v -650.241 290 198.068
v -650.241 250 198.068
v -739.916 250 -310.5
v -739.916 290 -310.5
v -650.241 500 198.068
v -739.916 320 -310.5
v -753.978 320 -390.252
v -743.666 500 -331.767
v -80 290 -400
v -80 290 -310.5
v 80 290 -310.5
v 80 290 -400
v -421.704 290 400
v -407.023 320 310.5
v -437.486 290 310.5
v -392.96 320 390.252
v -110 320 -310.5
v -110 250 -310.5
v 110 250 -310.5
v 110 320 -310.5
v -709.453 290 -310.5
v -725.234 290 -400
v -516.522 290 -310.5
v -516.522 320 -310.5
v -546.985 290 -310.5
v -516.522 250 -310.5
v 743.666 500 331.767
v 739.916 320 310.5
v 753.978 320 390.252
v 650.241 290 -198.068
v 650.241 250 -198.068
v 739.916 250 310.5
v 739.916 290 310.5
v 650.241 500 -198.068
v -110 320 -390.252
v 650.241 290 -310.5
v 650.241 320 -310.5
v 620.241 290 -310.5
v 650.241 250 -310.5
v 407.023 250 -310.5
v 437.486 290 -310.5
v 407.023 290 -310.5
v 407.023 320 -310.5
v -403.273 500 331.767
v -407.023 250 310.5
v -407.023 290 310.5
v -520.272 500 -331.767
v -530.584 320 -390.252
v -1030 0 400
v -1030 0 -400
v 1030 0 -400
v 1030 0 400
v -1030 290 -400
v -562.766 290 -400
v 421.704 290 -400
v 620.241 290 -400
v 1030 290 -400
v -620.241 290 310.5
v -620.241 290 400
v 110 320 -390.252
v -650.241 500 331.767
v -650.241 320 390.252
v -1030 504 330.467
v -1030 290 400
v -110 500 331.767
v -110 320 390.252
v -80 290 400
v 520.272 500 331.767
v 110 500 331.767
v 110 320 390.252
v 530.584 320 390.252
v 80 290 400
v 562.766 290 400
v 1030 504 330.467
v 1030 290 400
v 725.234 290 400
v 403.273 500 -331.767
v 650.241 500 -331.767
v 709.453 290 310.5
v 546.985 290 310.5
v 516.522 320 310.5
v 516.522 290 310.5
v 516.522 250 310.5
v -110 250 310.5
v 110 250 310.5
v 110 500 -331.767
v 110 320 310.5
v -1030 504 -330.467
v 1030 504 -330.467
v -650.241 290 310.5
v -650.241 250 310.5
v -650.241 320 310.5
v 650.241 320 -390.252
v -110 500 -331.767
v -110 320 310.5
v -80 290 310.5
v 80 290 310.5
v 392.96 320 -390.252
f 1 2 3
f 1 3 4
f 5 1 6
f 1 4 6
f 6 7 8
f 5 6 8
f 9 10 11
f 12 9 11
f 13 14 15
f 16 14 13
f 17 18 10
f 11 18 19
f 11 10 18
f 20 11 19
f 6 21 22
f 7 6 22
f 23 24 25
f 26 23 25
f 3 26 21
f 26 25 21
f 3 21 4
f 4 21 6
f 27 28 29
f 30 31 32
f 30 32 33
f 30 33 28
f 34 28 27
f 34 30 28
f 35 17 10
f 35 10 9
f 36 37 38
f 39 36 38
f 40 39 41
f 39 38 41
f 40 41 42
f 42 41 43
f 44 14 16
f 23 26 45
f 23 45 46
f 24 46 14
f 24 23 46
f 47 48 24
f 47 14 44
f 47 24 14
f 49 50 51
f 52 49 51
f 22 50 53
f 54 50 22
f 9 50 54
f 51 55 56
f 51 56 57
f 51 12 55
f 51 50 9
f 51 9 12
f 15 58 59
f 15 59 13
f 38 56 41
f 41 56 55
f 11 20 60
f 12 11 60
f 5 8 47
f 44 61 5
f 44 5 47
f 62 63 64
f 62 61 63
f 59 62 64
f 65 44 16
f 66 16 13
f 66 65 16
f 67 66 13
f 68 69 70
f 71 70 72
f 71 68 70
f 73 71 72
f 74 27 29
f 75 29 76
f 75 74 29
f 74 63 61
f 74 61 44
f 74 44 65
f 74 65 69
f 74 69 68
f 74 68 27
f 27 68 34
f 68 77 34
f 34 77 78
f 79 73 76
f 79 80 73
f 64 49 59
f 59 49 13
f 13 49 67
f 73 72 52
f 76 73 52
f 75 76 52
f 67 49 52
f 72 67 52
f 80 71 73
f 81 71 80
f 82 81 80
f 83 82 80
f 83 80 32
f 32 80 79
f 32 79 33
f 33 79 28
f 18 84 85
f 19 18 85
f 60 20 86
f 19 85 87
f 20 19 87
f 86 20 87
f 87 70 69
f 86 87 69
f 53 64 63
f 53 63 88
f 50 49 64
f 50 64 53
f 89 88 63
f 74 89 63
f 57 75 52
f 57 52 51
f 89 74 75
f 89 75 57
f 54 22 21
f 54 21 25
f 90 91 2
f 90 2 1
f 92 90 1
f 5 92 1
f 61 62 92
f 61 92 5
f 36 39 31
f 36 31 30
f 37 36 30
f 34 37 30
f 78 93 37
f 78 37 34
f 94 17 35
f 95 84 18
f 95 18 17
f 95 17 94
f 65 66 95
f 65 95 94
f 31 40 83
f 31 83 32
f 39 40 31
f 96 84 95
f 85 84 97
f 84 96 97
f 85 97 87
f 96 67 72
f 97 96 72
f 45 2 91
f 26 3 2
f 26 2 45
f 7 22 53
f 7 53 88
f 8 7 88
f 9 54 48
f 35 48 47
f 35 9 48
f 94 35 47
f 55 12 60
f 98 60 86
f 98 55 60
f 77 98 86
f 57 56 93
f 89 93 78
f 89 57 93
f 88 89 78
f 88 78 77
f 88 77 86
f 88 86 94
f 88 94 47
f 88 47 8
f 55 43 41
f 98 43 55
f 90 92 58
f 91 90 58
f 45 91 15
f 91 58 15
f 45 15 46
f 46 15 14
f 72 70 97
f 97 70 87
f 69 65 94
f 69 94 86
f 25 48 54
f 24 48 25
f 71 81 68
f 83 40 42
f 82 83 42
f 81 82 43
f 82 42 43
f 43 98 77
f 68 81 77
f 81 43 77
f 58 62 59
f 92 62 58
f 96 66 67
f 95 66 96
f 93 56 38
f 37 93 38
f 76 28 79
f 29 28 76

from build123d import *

# Parameters (mm, degrees)
SKETCH_1_W               = 2060
SKETCH_1_H               = 800
EXTRUDE_1_DEPTH          = 500
SKETCH_3_W               = 220
SKETCH_3_H               = 220
CUT_EXTRUDE_1_DEPTH      = 310.5
EXTRUDE_2_REACH          = 2159.22
SKETCH_5_W               = 220
SKETCH_5_H               = 210
CUT_EXTRUDE_2_DEPTH      = 1399.18310675
SKETCH_7_W               = 220
SKETCH_7_H               = 210
CUT_EXTRUDE_3_DEPTH      = 1330.488578602
CUT_EXTRUDE_3_DEPTH_BACK = 1330.488578602
CUT_EXTRUDE_4_DEPTH      = 40
SKETCH_14_W              = 220
SKETCH_14_H              = 210
CUT_EXTRUDE_5_DEPTH      = 1330.488578602
CUT_EXTRUDE_5_DEPTH_BACK = 1330.488578602
CUT_EXTRUDE_6_DEPTH      = 40
SKETCH_16_W              = 35.606145385
SKETCH_16_H              = 210
CUT_EXTRUDE_7_DEPTH      = 1399.18310675
CUT_EXTRUDE_7_DEPTH_BACK = 1399.18310675
SKETCH_18_W              = 35.606145385
SKETCH_18_H              = 210
CUT_EXTRUDE_11_DEPTH     = 1399.18310675
CUT_EXTRUDE_12_DEPTH     = 40
CUT_EXTRUDE_15_DEPTH     = 2159.151060515
CHAMFER_1_SIZE           = 30
CUT_EXTRUDE_16_DEPTH     = 40
CHAMFER_2_SIZE           = 30


with BuildPart() as part:
    # 草图1 → 凸台-拉伸1 (new body)
    with BuildSketch(Plane(origin=(0, 0, 0), x_dir=(1, 0, 0), z_dir=(0, 1, 0))):
        Rectangle(SKETCH_1_W, SKETCH_1_H)
    extrude(amount=EXTRUDE_1_DEPTH)

    # 草图3 → 切除-拉伸1 (cut, symmetric)
    with BuildSketch(Plane.XY):
        with Locations((0, 360)):
            Rectangle(SKETCH_3_W, SKETCH_3_H)
    extrude(amount=CUT_EXTRUDE_1_DEPTH, both=True, mode=Mode.SUBTRACT)

    # 凸台-拉伸2: up to this face of the body (flat: up to its plane)
    extrude_2_end = Plane(part.part.faces().sort_by_distance((-1030, 250, 0))[0])
    # 草图22 → 凸台-拉伸2 (add, up to the picked face)
    with BuildSketch(Plane(origin=(1030, 0, 0), x_dir=(0, 0, -1), z_dir=(1, 0, 0)), mode=Mode.PRIVATE) as extrude_2_sk1:
        Polygon((-330.467185006, 504), (-400, 290), (400, 290), (330.467185006, 504), align=None)
    extrude_2_tool1 = split(extrude(extrude_2_sk1.sketch, amount=-EXTRUDE_2_REACH, mode=Mode.PRIVATE), bisect_by=extrude_2_end, keep=Keep.BOTH, mode=Mode.PRIVATE)
    add(extrude_2_tool1.solids().sort_by(Axis((1030, 393.604907, 0), (-1, 0, 0)))[0])

    # 草图5 → 切除-拉伸2 (cut, through all)
    with BuildSketch(Plane.XY.offset(400)):
        with Locations((0, 395)):
            Rectangle(SKETCH_5_W, SKETCH_5_H)
    extrude(amount=-CUT_EXTRUDE_2_DEPTH, mode=Mode.SUBTRACT)

    # 草图7 → 切除-拉伸3 (cut, two sides)
    with BuildSketch(Plane(origin=(37.34572837, 0, 211.798150344), x_dir=(0.9848077530122092, 0, -0.1736481776669237), z_dir=(0.1736481776669237, 0, 0.9848077530122092))) as cut_extrude_3_sk:
        with Locations((-564.756921873, 395)):
            Rectangle(SKETCH_7_W, SKETCH_7_H)
    extrude(amount=CUT_EXTRUDE_3_DEPTH, mode=Mode.SUBTRACT)
    extrude(cut_extrude_3_sk.sketch, amount=-CUT_EXTRUDE_3_DEPTH_BACK, mode=Mode.SUBTRACT)

    # 草图10 → 切除-拉伸4 (cut)
    with BuildSketch(Plane(origin=(0, 290, 0), x_dir=(1, 0, 0), z_dir=(0, 1, 0))):
        Polygon((-614.635342741, -310.5), (-407.022752899, -310.5), (-516.521807919, 310.5), (-739.915662534, 310.5), (-630.416607514, -310.5), align=None)
    extrude(amount=-CUT_EXTRUDE_4_DEPTH, mode=Mode.SUBTRACT)

    # 草图14 → 切除-拉伸5 (cut, two sides)
    with BuildSketch(Plane(origin=(37.34572837, 0, 211.798150344), x_dir=(0.9848077530122092, 0, -0.1736481776669237), z_dir=(0.1736481776669237, 0, 0.9848077530122092))) as cut_extrude_5_sk:
        with Locations((564.756921873, 395)):
            Rectangle(SKETCH_14_W, SKETCH_14_H)
    extrude(amount=CUT_EXTRUDE_5_DEPTH, mode=Mode.SUBTRACT)
    extrude(cut_extrude_5_sk.sketch, amount=-CUT_EXTRUDE_5_DEPTH_BACK, mode=Mode.SUBTRACT)

    # 草图15 → 切除-拉伸6 (cut)
    with BuildSketch(Plane(origin=(0, 290, 0), x_dir=(1, 0, 0), z_dir=(0, 1, 0))):
        Polygon((630.416607514, 310.5), (407.022752899, 310.5), (516.521807919, -310.5), (739.915662534, -310.5), align=None)
    extrude(amount=-CUT_EXTRUDE_6_DEPTH, mode=Mode.SUBTRACT)

    # 草图16 → 切除-拉伸7 (cut, two sides)
    with BuildSketch(Plane(origin=(0, 0, -400), x_dir=(-1, 0, 0), z_dir=(0, 0, -1))) as cut_extrude_7_sk:
        with Locations((-632.438415434, 395)):
            Rectangle(SKETCH_16_W, SKETCH_16_H)
    extrude(amount=CUT_EXTRUDE_7_DEPTH, mode=Mode.SUBTRACT)
    extrude(cut_extrude_7_sk.sketch, amount=-CUT_EXTRUDE_7_DEPTH_BACK, mode=Mode.SUBTRACT)

    # 草图18 → 切除-拉伸11 (cut, through all)
    with BuildSketch(Plane.XY.offset(400)):
        with Locations((-632.438415434, 395)):
            Rectangle(SKETCH_18_W, SKETCH_18_H)
    extrude(amount=-CUT_EXTRUDE_11_DEPTH, mode=Mode.SUBTRACT)

    # 草图19 → 切除-拉伸12 (cut)
    with BuildSketch(Plane(origin=(0, 290, 0), x_dir=(1, 0, 0), z_dir=(0, 1, 0))):
        Polygon((-650.241488126, -310.5), (-630.416607514, -310.5), (-650.241488126, -198.067515011), align=None)
    extrude(amount=-CUT_EXTRUDE_12_DEPTH, mode=Mode.SUBTRACT)

    # 草图23 → 切除-拉伸15 (cut, through all)
    with BuildSketch(Plane(origin=(1030, 0, 0), x_dir=(0, 0, -1), z_dir=(1, 0, 0))):
        Polygon((400, 500), (400, 290), (331.766863791, 500), align=None)
        Polygon((-400, 500), (-400, 290), (-331.766863791, 500), align=None)
    extrude(amount=-CUT_EXTRUDE_15_DEPTH, mode=Mode.SUBTRACT)

    # 倒角1
    chamfer_1_edges = [part.edges().sort_by_distance(p)[0] for p in [
        (-399.132120513, 290, 355.25),
        (524.412440306, 290, 355.25),
        (747.806294921, 290, 355.25),
        (-650.241488126, 290, 355.25),
        (110, 290, 355.25),
        (-110, 290, 355.25),
    ]]
    chamfer(chamfer_1_edges, length=CHAMFER_1_SIZE)

    # 草图24 → 切除-拉伸16 (cut)
    with BuildSketch(Plane(origin=(0, 290, 0), x_dir=(1, 0, 0), z_dir=(0, 1, 0))):
        Polygon((650.241488126, 310.5), (630.416607514, 310.5), (650.241488126, 198.067515011), align=None)
    extrude(amount=-CUT_EXTRUDE_16_DEPTH, mode=Mode.SUBTRACT)

    # 倒角2
    chamfer_2_edges = [part.edges().sort_by_distance(p)[0] for p in [
        (399.132120513, 290, -355.25),
        (650.241488126, 290, -355.25),
        (110, 290, -355.25),
        (-110, 290, -355.25),
        (-524.412440306, 290, -355.25),
        (-747.806294921, 290, -355.25),
    ]]
    chamfer(chamfer_2_edges, length=CHAMFER_2_SIZE)


solid = part.part
